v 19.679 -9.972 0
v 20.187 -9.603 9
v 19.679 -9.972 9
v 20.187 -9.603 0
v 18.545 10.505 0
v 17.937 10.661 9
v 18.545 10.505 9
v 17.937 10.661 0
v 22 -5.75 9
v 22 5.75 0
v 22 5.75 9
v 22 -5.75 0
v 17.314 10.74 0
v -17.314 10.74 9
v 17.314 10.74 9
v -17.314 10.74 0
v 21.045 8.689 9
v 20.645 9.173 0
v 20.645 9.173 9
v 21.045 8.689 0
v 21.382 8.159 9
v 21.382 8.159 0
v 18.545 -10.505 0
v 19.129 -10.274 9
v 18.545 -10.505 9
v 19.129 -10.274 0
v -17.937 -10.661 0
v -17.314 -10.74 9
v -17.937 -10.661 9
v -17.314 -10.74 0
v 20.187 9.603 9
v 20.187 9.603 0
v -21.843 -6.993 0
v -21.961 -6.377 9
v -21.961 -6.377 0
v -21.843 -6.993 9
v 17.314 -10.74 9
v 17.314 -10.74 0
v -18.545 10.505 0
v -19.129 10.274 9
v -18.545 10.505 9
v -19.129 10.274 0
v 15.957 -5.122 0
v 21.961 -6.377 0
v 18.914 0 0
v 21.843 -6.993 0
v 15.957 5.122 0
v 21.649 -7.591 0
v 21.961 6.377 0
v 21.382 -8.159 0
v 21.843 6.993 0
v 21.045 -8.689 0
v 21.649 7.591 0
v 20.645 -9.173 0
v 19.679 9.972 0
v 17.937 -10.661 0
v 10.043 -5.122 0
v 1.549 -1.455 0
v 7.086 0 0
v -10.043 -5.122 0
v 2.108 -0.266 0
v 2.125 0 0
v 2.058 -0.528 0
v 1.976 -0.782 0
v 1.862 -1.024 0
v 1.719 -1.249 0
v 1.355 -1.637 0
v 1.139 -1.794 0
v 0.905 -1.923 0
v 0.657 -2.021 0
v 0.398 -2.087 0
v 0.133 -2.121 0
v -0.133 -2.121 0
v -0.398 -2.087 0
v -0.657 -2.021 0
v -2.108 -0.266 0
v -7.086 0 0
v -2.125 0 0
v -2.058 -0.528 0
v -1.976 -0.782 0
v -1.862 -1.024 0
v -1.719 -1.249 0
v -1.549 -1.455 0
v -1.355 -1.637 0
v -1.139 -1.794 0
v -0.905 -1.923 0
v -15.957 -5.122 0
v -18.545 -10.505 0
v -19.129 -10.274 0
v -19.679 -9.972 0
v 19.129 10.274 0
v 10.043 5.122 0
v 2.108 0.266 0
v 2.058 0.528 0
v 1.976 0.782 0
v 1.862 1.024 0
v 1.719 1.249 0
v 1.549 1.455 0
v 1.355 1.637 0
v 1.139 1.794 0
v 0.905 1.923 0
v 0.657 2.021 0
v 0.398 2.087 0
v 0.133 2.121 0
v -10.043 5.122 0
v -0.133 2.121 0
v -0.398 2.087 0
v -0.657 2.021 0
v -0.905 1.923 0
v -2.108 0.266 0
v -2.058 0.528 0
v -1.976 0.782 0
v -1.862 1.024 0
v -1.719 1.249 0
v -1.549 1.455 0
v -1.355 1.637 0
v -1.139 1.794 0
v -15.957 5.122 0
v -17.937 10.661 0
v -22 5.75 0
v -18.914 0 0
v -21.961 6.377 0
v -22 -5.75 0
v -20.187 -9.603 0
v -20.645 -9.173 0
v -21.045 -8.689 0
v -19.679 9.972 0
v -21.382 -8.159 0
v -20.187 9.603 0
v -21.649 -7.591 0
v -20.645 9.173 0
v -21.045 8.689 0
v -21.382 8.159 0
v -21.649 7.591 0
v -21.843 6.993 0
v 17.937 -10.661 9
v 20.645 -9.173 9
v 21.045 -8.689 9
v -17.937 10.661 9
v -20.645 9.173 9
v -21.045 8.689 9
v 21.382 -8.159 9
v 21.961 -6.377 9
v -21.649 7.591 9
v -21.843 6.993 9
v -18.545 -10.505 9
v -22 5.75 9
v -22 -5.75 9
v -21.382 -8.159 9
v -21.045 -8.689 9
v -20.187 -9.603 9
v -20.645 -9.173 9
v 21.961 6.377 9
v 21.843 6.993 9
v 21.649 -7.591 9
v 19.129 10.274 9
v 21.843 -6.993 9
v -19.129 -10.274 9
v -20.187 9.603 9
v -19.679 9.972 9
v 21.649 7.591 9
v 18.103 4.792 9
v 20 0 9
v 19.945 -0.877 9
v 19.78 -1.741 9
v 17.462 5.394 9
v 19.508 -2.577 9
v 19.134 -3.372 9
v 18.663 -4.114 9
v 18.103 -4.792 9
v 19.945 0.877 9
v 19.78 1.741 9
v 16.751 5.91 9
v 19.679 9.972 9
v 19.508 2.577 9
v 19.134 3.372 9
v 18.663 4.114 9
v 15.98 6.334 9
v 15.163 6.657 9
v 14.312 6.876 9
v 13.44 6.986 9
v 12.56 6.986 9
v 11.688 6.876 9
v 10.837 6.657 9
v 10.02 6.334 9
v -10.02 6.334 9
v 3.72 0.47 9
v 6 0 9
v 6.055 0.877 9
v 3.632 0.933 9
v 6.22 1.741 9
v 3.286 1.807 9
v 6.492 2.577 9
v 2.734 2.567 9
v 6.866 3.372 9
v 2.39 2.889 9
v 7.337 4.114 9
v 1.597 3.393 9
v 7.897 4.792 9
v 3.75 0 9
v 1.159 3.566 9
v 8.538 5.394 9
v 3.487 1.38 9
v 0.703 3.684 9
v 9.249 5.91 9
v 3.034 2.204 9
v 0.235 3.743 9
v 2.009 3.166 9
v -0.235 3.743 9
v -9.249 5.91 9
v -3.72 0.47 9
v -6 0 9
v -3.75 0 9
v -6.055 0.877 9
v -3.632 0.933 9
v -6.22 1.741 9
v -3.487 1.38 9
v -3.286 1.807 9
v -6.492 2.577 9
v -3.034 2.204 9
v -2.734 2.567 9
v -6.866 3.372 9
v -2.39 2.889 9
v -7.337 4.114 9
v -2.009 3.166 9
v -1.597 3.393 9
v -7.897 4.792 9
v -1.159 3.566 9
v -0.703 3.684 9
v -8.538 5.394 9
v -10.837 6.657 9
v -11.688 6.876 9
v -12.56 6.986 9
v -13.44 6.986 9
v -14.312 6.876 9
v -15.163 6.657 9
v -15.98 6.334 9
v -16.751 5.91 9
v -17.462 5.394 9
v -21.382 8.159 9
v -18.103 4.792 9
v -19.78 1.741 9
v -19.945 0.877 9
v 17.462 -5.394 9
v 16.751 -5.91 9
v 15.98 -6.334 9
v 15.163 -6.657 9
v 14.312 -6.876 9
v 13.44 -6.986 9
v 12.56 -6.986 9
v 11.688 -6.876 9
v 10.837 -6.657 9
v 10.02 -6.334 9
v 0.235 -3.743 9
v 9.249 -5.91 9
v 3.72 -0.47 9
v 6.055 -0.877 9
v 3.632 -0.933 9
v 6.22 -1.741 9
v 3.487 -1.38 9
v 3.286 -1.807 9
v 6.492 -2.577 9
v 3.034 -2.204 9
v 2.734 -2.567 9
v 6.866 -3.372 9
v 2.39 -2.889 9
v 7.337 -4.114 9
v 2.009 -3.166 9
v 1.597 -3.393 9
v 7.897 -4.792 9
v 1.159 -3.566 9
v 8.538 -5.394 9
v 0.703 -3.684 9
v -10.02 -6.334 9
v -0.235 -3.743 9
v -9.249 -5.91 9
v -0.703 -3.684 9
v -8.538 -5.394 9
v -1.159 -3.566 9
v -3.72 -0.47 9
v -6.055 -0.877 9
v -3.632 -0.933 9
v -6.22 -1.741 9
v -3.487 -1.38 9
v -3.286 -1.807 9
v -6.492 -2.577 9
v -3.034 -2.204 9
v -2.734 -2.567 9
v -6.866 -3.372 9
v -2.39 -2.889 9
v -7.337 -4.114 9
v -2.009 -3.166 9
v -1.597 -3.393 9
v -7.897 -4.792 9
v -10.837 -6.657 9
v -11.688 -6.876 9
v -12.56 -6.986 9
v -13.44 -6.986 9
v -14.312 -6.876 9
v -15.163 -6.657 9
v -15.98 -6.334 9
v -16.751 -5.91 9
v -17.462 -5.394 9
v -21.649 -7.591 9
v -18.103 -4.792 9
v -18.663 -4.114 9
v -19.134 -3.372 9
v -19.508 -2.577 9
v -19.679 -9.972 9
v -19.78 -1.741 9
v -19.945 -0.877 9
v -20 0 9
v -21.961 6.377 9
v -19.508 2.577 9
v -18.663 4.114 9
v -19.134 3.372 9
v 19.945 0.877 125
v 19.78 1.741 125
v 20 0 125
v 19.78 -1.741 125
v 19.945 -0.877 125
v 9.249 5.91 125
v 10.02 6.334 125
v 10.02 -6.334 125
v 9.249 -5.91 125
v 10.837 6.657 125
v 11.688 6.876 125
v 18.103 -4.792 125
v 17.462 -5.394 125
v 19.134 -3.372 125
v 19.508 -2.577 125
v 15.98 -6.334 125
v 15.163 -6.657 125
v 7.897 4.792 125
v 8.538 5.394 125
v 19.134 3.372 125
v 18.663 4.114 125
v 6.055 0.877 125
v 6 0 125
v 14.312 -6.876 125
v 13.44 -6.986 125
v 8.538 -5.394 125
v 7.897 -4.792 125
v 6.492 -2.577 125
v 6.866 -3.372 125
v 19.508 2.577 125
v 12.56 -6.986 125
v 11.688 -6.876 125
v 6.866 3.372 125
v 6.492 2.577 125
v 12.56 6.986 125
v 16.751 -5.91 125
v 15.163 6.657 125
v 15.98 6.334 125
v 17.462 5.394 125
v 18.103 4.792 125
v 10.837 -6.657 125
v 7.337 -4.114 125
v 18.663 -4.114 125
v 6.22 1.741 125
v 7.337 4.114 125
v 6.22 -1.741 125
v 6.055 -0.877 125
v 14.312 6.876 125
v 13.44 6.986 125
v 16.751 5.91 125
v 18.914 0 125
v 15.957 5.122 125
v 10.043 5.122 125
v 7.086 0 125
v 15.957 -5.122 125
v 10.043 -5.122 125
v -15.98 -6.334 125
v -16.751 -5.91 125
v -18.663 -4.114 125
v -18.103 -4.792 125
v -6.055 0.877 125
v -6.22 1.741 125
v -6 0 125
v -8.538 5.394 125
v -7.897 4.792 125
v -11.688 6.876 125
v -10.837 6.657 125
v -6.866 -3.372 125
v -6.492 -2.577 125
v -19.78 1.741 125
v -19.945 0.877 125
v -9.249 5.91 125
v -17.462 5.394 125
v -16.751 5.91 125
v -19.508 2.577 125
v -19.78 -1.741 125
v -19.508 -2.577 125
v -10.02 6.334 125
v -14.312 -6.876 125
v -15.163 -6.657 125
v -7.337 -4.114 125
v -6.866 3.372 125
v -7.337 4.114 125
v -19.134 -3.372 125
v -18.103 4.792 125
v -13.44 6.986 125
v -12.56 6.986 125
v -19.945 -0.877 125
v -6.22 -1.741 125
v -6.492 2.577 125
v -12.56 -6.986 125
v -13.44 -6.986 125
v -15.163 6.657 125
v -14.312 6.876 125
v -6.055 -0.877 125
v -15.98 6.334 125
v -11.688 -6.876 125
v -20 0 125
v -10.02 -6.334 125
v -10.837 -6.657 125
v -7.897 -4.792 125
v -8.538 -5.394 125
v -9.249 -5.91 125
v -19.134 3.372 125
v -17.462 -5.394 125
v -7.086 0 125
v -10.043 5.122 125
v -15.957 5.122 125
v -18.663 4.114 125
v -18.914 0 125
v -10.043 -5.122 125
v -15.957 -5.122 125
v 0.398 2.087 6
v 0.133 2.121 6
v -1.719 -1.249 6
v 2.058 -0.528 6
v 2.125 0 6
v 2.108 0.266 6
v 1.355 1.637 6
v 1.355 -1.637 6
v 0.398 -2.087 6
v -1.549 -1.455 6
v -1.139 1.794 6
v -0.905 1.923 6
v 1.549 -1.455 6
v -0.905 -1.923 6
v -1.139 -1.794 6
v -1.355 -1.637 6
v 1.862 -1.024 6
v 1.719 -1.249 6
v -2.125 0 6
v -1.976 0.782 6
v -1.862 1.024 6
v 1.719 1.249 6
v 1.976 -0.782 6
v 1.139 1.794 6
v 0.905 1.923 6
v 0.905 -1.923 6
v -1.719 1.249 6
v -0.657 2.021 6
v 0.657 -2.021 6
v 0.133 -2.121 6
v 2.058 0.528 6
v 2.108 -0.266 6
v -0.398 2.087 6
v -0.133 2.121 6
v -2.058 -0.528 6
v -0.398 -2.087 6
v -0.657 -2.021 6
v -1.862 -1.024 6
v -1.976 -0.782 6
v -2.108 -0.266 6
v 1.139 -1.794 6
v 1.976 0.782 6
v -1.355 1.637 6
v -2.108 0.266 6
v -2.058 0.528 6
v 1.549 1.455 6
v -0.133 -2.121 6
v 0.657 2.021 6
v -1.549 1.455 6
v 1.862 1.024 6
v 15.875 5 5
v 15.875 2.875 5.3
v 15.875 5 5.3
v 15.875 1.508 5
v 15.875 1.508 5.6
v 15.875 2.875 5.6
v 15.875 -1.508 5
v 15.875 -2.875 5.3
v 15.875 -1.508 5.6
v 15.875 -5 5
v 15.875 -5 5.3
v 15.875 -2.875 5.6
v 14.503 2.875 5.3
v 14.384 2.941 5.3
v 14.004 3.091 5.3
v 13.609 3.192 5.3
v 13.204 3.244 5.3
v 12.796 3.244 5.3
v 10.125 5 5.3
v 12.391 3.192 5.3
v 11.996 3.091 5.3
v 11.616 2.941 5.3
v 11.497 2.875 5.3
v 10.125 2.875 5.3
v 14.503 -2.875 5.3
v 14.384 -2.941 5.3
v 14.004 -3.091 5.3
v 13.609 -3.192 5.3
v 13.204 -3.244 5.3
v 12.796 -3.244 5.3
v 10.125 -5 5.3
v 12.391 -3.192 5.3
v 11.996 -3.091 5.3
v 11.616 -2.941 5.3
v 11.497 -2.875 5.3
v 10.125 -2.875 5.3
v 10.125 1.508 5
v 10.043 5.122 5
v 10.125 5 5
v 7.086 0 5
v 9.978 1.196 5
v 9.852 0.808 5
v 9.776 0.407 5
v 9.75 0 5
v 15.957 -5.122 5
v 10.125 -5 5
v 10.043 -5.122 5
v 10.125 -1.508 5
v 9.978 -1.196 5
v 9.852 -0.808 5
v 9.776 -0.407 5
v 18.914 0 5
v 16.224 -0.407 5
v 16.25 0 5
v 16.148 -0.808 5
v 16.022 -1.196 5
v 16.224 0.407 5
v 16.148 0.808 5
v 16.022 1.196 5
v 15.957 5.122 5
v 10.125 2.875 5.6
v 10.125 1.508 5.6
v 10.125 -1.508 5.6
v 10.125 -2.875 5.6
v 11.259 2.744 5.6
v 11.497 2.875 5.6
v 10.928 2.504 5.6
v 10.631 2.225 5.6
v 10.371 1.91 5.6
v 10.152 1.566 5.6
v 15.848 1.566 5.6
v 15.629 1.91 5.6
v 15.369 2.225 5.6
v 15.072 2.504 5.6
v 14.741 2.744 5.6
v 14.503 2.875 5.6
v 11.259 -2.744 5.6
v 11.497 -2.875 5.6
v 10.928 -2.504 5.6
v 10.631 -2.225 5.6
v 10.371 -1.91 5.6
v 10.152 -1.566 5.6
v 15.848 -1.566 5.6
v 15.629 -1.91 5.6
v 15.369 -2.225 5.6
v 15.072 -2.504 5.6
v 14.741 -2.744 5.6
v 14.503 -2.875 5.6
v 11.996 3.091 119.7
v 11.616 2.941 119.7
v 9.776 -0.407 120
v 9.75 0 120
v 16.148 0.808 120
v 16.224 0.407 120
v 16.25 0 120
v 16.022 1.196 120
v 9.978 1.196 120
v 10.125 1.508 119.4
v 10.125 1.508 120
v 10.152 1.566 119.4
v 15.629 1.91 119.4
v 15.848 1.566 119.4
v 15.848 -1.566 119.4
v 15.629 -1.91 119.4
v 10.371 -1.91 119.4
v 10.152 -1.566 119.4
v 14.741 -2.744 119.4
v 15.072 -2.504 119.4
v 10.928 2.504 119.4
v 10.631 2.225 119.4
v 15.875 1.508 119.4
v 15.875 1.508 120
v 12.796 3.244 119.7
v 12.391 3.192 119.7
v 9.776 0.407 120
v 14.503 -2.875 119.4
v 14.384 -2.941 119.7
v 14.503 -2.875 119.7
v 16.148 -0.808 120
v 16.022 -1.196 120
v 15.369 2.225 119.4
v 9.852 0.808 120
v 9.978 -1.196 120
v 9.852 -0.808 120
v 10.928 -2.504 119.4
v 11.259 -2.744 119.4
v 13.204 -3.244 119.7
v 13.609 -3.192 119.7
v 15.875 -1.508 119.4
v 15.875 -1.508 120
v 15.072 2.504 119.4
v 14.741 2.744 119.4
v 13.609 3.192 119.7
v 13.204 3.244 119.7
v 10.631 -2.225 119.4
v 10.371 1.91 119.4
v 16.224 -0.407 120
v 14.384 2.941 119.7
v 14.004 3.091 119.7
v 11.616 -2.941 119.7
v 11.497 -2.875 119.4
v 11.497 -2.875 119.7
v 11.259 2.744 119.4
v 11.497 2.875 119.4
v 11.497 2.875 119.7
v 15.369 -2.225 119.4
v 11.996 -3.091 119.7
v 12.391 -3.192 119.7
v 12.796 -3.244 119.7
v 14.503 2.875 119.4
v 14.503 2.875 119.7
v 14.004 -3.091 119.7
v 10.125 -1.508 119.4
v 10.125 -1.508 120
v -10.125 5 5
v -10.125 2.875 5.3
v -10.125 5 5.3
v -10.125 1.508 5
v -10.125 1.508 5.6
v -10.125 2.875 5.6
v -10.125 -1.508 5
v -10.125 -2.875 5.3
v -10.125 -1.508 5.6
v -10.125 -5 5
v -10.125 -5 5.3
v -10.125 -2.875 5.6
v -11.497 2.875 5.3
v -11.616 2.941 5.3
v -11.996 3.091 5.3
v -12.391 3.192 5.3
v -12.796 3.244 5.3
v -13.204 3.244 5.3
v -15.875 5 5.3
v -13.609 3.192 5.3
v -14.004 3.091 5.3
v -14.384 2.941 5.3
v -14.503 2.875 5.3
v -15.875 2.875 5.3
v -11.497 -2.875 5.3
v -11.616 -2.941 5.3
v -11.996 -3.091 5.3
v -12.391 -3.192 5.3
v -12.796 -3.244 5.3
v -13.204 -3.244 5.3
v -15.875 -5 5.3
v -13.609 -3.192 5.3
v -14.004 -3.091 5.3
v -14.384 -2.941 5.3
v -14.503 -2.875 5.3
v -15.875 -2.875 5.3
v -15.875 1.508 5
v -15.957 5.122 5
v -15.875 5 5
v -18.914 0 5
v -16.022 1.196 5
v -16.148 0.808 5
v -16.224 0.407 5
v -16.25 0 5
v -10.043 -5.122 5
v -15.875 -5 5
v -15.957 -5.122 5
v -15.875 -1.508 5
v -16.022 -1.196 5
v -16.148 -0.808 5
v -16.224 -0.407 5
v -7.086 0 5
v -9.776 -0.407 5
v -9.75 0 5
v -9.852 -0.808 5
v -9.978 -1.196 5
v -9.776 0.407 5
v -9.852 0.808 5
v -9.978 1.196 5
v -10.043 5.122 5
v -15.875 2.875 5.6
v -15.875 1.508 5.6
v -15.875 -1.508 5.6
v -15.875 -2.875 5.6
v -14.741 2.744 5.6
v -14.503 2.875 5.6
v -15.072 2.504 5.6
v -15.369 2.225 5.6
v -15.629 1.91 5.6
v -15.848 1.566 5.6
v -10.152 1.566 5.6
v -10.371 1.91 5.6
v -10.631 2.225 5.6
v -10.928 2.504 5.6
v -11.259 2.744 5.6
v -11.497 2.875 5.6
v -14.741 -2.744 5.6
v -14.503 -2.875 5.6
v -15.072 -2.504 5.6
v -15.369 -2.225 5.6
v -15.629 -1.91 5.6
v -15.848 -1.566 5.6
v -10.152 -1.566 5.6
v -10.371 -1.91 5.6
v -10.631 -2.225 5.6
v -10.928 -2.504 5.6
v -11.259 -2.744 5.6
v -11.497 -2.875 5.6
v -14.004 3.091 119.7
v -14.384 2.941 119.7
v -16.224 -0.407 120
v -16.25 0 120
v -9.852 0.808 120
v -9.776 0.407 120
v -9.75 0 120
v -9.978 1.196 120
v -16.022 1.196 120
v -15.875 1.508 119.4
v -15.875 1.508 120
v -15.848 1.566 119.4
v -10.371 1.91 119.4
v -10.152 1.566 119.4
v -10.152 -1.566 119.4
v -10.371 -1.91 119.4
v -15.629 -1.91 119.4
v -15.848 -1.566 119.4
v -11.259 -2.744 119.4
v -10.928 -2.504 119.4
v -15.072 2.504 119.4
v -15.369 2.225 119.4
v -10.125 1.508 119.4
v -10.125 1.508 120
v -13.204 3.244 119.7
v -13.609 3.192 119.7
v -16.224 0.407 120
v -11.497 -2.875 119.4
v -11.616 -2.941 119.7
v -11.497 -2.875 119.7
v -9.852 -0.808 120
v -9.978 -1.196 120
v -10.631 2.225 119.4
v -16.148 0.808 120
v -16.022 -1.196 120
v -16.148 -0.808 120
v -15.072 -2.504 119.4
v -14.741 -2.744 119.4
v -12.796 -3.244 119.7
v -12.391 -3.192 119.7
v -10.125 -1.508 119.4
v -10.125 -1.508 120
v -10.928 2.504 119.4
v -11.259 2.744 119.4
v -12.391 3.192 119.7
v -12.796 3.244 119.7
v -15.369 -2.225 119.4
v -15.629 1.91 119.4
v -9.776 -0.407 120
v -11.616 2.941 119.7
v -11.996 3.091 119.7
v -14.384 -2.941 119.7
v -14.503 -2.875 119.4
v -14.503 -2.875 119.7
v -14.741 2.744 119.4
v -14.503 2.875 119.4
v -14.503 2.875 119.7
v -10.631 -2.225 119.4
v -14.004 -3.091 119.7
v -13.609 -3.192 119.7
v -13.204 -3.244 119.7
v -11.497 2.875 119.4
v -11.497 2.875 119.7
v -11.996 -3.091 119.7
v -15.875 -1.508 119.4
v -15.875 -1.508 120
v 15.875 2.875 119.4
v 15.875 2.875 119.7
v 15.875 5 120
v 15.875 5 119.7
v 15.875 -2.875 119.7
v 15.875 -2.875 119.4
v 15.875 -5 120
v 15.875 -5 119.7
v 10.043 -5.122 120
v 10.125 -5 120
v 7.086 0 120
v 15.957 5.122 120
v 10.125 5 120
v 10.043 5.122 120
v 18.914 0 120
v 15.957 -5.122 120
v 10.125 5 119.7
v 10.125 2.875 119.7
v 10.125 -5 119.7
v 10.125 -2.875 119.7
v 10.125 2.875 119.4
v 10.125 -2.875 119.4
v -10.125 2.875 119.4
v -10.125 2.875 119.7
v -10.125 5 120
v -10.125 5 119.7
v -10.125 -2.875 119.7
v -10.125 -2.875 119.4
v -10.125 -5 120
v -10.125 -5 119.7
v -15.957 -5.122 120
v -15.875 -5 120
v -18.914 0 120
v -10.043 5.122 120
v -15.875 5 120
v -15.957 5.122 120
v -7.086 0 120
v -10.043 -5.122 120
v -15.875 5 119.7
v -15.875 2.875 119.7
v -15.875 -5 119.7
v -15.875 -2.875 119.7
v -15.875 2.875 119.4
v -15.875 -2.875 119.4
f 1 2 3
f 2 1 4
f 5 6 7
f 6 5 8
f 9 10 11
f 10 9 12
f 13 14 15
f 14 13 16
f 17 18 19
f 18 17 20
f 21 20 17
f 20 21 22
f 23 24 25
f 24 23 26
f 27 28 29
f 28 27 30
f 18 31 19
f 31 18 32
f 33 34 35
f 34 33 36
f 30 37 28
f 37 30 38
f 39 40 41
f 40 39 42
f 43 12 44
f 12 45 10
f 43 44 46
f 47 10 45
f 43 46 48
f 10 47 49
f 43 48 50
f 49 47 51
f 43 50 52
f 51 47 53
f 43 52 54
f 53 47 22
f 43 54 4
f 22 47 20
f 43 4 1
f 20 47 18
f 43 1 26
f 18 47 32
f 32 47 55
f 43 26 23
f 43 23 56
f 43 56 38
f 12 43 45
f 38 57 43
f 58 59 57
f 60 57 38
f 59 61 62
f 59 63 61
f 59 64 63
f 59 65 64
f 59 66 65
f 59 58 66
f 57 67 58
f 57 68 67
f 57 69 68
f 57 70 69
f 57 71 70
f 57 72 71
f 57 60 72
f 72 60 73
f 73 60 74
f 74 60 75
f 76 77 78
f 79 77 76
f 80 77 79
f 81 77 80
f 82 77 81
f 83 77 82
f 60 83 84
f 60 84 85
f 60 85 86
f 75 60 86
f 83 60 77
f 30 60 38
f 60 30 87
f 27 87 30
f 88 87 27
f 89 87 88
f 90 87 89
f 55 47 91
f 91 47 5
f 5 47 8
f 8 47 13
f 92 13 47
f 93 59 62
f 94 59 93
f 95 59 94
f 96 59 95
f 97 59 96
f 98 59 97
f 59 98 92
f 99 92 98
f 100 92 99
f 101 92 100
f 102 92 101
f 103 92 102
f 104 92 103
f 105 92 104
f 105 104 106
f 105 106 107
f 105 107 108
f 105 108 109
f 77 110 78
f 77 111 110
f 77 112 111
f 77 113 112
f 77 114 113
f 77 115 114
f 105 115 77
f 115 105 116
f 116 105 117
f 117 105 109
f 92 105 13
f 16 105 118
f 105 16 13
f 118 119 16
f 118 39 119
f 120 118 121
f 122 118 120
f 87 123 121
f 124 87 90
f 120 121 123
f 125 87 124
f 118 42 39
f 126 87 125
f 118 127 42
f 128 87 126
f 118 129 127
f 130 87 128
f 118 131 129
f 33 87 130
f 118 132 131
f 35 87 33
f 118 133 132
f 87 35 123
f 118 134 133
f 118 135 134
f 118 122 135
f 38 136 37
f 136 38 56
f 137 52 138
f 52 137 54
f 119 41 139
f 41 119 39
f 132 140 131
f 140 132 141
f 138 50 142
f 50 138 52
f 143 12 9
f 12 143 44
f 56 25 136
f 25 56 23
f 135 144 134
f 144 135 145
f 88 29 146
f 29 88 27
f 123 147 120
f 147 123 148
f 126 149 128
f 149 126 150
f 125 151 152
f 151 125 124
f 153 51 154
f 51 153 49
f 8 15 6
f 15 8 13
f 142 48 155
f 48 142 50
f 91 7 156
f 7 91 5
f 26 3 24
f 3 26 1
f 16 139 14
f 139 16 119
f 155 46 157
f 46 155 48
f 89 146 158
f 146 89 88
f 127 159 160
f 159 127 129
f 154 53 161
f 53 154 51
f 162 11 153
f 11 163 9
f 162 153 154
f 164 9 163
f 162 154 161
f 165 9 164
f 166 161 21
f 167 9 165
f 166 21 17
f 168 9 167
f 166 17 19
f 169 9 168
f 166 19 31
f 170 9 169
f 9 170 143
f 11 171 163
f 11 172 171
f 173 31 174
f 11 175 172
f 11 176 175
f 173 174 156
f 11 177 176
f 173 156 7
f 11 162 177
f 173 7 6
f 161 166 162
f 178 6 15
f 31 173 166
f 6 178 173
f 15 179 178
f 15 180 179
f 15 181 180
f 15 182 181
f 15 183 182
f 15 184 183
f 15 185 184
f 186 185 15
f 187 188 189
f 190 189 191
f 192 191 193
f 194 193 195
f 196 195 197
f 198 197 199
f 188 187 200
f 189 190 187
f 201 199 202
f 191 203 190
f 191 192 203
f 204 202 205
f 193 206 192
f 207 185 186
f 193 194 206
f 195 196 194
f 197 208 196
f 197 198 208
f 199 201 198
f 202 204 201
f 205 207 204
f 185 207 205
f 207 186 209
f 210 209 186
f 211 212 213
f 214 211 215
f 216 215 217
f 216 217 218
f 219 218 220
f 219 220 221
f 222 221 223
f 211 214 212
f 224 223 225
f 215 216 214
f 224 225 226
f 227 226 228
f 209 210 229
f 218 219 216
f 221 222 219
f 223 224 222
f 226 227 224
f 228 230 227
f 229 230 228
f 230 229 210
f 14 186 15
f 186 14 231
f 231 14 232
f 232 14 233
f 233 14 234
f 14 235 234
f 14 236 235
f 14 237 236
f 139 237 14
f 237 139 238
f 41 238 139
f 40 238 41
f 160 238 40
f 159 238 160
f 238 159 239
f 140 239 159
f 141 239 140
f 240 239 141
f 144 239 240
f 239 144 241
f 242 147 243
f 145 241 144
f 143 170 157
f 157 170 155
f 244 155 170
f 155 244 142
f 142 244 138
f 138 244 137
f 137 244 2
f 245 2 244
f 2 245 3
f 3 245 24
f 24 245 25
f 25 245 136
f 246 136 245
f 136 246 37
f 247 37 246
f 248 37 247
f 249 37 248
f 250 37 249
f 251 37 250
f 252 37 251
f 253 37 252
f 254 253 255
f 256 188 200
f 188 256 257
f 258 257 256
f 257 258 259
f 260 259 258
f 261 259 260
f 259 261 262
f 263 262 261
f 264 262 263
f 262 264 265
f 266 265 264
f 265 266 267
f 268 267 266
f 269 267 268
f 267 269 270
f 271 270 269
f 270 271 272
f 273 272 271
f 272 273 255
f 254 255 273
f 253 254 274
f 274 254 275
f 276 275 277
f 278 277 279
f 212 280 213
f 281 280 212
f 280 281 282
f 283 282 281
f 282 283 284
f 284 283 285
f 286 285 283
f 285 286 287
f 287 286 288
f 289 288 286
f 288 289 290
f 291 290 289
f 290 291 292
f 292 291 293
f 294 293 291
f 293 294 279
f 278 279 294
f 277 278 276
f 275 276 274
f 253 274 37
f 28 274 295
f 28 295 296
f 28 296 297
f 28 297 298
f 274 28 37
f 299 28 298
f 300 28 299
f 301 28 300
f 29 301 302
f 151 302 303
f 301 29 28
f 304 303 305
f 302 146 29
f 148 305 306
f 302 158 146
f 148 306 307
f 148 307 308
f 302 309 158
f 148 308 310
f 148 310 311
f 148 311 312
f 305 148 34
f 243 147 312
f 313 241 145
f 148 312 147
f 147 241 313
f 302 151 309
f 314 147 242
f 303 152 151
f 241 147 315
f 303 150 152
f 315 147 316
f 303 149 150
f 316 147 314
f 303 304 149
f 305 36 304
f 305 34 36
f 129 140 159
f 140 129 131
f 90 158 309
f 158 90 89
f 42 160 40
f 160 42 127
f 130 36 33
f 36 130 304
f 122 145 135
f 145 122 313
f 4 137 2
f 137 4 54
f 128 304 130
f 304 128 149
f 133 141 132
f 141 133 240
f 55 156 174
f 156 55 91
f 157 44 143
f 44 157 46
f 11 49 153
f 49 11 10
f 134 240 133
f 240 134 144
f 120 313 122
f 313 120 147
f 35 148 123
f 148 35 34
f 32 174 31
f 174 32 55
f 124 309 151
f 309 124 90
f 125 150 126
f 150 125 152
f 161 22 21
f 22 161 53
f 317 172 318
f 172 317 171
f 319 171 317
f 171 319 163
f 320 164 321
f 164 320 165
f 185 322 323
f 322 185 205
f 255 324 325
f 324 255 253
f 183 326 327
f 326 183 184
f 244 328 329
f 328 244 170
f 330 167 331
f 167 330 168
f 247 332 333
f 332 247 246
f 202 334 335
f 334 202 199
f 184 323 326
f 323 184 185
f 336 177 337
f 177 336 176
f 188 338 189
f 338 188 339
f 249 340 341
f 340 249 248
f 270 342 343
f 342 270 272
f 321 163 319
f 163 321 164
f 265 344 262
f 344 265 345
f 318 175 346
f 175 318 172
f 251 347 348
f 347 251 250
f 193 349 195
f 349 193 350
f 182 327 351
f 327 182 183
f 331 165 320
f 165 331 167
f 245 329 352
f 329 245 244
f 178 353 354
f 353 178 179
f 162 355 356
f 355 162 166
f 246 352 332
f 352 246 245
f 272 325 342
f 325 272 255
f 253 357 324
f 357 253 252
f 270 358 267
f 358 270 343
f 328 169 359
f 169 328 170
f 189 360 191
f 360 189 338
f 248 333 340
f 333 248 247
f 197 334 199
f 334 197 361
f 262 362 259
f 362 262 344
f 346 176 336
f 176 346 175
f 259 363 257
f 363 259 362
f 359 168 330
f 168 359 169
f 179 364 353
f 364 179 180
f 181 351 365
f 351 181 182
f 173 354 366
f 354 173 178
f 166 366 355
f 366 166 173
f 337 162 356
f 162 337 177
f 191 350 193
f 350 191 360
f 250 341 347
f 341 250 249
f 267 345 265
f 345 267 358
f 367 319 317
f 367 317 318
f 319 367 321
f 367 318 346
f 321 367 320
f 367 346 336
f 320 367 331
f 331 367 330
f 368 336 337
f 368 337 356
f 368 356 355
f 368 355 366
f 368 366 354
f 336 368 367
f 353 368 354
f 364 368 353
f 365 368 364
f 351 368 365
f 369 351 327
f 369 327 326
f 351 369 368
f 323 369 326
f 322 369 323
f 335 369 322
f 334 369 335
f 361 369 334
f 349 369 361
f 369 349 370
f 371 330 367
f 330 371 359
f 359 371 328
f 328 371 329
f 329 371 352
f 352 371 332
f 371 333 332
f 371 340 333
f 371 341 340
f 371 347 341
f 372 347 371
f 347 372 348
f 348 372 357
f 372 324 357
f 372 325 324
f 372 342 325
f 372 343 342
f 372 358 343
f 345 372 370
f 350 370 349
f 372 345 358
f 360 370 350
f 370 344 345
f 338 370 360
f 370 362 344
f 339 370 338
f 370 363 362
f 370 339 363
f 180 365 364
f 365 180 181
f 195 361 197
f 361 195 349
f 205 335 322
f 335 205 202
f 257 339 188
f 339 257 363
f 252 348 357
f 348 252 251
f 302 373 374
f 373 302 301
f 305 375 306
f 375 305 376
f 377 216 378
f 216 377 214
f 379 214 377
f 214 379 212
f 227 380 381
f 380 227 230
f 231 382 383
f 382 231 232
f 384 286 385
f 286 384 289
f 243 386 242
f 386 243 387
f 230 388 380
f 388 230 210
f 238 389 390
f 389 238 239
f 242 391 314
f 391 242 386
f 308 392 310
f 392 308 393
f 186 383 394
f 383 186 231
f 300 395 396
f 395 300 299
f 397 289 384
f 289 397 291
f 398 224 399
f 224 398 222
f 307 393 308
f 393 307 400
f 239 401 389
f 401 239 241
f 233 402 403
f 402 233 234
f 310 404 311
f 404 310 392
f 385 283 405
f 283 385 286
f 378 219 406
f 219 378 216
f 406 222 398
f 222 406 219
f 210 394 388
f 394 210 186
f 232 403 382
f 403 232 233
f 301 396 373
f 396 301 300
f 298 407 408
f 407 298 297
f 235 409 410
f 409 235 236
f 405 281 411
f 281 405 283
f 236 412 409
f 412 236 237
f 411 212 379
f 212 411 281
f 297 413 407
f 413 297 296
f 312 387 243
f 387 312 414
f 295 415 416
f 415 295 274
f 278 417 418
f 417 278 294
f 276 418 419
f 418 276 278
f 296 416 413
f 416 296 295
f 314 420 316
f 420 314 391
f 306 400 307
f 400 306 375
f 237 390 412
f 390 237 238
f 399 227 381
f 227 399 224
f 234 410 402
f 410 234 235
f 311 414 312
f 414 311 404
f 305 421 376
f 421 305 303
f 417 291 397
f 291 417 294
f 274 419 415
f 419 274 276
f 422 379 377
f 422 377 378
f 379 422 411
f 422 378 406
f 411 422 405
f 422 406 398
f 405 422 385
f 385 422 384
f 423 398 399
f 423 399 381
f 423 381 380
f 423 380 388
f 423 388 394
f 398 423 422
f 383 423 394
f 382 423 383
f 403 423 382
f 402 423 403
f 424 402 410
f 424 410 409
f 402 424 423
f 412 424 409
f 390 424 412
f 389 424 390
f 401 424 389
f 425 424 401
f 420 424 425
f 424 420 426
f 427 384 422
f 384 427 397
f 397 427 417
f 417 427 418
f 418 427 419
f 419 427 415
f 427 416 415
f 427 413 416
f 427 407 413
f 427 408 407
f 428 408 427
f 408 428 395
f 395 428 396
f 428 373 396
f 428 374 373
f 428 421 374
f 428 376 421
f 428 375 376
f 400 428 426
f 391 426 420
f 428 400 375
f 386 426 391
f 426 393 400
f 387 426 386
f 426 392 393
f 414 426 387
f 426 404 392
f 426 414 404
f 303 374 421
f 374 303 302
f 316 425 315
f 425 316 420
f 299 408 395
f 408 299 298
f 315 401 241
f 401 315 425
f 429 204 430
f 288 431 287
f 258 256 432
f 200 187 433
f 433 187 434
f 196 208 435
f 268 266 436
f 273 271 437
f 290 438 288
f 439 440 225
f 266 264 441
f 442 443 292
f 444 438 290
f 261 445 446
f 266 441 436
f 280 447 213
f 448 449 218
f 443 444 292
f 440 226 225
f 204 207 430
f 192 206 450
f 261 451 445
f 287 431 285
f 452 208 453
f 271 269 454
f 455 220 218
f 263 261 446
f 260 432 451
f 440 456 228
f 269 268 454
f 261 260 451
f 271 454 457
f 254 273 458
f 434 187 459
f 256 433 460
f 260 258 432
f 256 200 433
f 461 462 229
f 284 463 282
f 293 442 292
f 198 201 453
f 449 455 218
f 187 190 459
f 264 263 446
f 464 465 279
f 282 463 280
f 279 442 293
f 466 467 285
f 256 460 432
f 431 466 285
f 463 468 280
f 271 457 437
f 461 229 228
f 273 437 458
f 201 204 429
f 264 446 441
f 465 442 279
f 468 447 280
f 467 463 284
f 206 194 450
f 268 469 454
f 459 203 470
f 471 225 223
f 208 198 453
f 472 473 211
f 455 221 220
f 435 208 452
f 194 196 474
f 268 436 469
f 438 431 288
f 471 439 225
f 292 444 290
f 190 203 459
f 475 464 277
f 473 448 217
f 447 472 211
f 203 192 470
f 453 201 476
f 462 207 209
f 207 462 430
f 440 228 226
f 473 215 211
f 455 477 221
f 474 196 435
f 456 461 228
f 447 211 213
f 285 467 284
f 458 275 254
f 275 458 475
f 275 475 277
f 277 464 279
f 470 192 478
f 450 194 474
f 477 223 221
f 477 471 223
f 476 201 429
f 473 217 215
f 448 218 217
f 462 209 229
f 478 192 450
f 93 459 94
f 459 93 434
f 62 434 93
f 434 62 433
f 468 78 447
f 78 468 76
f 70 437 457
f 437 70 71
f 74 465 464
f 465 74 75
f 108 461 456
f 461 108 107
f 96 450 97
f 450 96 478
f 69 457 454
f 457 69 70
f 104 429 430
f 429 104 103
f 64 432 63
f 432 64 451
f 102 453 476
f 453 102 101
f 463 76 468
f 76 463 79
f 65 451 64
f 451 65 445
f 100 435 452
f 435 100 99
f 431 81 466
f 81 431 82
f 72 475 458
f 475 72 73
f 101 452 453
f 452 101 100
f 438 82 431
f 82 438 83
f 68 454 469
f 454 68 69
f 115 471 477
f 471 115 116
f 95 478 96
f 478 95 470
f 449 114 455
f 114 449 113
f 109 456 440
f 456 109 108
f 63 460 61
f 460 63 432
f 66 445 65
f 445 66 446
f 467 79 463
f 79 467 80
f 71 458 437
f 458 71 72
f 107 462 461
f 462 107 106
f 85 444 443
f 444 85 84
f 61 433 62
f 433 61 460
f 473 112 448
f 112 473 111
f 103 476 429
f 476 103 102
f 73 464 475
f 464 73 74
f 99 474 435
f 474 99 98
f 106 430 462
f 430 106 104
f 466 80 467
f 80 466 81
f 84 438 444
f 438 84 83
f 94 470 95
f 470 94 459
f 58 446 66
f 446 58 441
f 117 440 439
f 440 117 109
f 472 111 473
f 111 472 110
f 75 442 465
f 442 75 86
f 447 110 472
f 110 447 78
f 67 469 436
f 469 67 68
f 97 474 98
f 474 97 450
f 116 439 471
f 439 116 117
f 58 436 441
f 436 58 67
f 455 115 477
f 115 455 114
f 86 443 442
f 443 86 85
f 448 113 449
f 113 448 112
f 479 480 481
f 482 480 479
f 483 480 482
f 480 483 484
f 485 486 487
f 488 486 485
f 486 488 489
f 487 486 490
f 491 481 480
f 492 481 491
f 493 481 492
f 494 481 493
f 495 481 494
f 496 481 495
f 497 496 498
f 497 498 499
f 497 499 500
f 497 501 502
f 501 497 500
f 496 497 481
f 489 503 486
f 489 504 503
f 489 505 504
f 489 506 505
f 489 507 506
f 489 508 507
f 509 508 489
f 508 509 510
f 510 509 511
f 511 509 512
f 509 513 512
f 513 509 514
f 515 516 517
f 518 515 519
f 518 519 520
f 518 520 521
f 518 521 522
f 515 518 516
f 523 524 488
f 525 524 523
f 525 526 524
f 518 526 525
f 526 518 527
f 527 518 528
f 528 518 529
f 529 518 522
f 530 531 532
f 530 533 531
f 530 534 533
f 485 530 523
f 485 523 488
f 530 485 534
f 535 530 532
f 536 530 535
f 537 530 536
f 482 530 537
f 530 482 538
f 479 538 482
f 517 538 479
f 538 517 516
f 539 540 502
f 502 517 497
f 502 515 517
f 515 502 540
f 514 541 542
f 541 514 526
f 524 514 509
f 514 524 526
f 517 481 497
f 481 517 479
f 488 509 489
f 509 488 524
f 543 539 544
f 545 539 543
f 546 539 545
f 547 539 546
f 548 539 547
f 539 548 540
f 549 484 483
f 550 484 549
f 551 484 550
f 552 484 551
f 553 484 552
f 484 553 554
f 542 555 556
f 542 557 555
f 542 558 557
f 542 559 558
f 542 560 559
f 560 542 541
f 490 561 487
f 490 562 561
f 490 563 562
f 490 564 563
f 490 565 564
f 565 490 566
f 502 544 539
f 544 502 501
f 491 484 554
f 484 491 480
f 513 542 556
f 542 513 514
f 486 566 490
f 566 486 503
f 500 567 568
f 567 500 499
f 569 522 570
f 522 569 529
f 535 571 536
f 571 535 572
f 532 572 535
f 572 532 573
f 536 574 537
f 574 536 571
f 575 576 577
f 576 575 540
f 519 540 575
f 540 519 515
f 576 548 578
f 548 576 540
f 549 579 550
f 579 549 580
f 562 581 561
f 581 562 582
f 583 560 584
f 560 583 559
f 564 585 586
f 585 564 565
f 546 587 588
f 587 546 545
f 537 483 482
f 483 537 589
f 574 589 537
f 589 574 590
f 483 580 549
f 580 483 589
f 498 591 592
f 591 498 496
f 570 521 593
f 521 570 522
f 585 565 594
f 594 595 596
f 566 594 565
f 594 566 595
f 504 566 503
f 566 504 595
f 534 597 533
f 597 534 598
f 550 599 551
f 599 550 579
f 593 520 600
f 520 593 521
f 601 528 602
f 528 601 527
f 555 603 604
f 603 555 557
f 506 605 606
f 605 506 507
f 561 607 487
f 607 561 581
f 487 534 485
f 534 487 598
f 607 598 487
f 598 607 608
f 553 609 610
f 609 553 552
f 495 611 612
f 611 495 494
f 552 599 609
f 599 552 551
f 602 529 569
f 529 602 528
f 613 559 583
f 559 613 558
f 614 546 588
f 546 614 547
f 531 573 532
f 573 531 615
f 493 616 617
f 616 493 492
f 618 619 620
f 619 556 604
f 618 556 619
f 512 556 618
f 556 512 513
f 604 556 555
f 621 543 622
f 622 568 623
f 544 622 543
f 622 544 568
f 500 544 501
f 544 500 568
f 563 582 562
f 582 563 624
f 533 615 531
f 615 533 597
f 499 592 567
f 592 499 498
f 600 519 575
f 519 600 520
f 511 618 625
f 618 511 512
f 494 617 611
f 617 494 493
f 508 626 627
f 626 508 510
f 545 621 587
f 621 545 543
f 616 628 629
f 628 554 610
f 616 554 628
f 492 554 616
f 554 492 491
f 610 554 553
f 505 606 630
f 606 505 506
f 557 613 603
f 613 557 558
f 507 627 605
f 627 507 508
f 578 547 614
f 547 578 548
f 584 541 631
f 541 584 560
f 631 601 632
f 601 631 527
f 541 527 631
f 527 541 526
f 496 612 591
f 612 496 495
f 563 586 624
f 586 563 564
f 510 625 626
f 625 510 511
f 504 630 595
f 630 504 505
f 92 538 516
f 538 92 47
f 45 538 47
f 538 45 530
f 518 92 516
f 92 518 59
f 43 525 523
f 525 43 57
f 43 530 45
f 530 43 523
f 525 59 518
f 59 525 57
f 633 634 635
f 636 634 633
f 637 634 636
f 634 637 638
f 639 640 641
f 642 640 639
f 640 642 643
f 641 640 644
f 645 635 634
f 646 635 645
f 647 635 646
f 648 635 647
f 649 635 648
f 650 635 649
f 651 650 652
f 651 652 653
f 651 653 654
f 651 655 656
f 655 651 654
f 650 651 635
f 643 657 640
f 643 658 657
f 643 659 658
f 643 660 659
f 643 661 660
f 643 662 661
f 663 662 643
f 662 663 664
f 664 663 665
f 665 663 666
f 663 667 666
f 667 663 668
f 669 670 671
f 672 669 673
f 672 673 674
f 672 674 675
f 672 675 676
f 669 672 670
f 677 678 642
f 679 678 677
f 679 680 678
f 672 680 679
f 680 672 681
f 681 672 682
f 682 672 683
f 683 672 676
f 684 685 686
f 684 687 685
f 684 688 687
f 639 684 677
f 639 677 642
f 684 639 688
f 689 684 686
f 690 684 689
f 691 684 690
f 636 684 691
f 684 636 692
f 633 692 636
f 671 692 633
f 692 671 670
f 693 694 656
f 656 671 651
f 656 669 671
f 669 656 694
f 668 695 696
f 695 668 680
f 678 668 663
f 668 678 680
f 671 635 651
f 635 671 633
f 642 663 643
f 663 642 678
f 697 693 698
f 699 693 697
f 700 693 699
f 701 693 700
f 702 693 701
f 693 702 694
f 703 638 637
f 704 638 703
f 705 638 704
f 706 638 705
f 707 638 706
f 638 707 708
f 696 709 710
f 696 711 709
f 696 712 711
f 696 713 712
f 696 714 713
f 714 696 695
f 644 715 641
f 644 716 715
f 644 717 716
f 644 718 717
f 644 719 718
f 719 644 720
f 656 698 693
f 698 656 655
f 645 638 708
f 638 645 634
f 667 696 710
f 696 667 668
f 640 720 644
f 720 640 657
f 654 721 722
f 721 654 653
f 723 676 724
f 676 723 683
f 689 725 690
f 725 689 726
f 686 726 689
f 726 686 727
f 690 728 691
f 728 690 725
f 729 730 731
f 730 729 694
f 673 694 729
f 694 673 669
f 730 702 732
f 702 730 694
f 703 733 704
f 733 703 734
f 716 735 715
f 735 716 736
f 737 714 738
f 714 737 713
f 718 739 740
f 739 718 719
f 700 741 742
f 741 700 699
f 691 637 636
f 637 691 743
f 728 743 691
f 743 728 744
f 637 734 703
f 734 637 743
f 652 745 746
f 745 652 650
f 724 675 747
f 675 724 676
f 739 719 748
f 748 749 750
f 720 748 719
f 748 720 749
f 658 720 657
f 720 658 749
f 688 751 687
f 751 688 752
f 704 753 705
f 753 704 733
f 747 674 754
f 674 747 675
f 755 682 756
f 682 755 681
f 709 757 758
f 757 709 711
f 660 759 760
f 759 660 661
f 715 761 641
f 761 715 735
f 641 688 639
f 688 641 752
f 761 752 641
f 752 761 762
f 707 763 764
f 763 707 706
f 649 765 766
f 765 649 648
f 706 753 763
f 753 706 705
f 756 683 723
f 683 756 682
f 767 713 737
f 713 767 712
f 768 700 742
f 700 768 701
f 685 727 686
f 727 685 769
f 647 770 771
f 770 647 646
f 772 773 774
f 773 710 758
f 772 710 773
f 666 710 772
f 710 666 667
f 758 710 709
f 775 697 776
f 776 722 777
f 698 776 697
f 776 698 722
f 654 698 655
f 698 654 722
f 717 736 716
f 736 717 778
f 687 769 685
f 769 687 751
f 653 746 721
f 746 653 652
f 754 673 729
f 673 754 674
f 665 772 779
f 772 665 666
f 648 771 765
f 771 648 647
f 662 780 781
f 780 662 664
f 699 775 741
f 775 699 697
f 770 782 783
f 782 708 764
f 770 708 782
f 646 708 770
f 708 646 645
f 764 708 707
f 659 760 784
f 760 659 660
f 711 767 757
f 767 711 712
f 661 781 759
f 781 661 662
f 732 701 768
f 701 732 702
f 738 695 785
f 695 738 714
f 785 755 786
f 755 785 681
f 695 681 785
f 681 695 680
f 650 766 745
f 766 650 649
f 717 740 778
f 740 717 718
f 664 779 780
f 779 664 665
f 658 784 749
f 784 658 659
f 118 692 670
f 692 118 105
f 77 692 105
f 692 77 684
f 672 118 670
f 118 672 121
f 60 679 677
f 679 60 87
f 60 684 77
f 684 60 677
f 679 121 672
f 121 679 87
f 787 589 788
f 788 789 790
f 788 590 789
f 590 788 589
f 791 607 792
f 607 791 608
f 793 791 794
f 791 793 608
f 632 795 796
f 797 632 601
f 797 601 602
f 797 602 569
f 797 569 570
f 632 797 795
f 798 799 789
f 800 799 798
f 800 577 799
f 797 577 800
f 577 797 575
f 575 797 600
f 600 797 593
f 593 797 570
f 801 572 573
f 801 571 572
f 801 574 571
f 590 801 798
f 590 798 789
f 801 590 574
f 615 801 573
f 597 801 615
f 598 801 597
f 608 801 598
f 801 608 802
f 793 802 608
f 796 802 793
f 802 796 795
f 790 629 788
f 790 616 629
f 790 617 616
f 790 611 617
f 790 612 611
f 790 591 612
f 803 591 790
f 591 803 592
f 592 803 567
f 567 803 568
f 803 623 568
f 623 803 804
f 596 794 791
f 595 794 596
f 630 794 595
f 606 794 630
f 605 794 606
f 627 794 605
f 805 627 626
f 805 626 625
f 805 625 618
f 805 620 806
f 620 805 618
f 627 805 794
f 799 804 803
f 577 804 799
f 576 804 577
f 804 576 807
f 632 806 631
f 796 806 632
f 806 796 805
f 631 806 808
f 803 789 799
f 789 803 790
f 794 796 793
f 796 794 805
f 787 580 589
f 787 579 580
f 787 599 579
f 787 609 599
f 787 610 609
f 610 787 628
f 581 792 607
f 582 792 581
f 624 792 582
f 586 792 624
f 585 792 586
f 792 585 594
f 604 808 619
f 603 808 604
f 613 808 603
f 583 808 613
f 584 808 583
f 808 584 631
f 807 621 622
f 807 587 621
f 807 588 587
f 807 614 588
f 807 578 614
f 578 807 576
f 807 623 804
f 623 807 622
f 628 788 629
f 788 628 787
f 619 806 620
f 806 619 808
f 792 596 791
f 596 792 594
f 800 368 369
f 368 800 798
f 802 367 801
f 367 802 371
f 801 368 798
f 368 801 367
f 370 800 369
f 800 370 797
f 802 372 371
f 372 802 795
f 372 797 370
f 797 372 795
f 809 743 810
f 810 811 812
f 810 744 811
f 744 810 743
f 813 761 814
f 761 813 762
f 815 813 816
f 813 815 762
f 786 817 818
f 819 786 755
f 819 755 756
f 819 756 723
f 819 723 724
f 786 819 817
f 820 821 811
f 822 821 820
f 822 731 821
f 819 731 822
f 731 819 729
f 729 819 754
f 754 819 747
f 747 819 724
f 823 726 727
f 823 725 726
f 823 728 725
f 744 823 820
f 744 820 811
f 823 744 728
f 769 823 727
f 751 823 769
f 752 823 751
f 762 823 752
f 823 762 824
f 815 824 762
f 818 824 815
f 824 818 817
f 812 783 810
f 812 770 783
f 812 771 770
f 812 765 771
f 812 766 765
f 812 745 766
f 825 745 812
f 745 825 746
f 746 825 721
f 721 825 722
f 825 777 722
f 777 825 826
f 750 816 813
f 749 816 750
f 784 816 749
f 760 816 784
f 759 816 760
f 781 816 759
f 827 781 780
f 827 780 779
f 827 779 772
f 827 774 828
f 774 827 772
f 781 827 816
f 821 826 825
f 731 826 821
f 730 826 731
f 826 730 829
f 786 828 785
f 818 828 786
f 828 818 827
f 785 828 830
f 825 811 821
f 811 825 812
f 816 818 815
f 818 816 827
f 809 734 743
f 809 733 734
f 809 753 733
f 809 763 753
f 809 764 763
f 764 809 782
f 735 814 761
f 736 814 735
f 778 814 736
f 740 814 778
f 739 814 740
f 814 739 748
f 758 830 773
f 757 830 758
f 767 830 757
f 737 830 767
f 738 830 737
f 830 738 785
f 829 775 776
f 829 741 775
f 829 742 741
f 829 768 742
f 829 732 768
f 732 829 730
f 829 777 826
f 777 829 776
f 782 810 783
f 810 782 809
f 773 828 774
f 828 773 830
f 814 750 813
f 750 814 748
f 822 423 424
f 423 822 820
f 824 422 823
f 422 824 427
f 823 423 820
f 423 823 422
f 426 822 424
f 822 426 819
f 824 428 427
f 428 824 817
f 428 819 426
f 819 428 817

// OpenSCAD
$fn = 50;


difference() {
	union() {
		hull() {
			translate(v = [-17.0000000000, 5.7500000000, 0]) {
				cylinder(h = 9, r = 5);
			}
			translate(v = [17.0000000000, 5.7500000000, 0]) {
				cylinder(h = 9, r = 5);
			}
			translate(v = [-17.0000000000, -5.7500000000, 0]) {
				cylinder(h = 9, r = 5);
			}
			translate(v = [17.0000000000, -5.7500000000, 0]) {
				cylinder(h = 9, r = 5);
			}
		}
		translate(v = [13.0000000000, 0, 0.0000000000]) {
			cylinder(h = 125, r = 7.0000000000);
		}
		translate(v = [-13.0000000000, 0, 0.0000000000]) {
			cylinder(h = 125, r = 7.0000000000);
		}
		translate(v = [13.0000000000, 0, 119.0000000000]) {
			cylinder(h = 6, r = 7.0000000000);
		}
		translate(v = [-13.0000000000, 0, 119.0000000000]) {
			cylinder(h = 6, r = 7.0000000000);
		}
	}
	union() {
		translate(v = [0, 0, 9]) {
			rotate(a = [0, 0, 0]) {
				difference() {
					union() {
						#translate(v = [0, 0, -120.0000000000]) {
							cylinder(h = 120, r = 2.0000000000);
						}
						#translate(v = [0, 0, -3]) {
							cylinder(h = 3, r1 = 2.1250000000, r2 = 3.7500000000);
						}
						#translate(v = [0, 0, -120.0000000000]) {
							cylinder(h = 120, r = 2.1250000000);
						}
						#translate(v = [0, 0, -120.0000000000]) {
							cylinder(h = 120, r = 2.0000000000);
						}
					}
					union();
				}
			}
		}
		translate(v = [13.0000000000, 0, 0]) {
			rotate(a = [0, 0, 0]) {
				difference() {
					union() {
						#translate(v = [-2.8750000000, -5.0000000000, -0.3000000000]) {
							cube(size = [5.7500000000, 10, 0.3000000000]);
						}
						#translate(v = [-2.8750000000, -2.8750000000, -0.6000000000]) {
							cube(size = [5.7500000000, 5.7500000000, 0.3000000000]);
						}
						#translate(v = [-2.8750000000, -5.0000000000, 5]) {
							cube(size = [5.7500000000, 10, 0.3000000000]);
						}
						#translate(v = [-2.8750000000, -2.8750000000, 5.3000000000]) {
							cube(size = [5.7500000000, 5.7500000000, 0.3000000000]);
						}
						#translate(v = [0, 0, -100.0000000000]) {
							cylinder(h = 200, r = 3.2500000000);
						}
						#linear_extrude(height = 5) {
							polygon(points = [[5.9142500000, 0.0000000000], [2.9571250000, 5.1218907443], [-2.9571250000, 5.1218907443], [-5.9142500000, 0.0000000000], [-2.9571250000, -5.1218907443], [2.9571250000, -5.1218907443]]);
						}
						#translate(v = [-2.8750000000, -5.0000000000, -0.3000000000]) {
							cube(size = [5.7500000000, 10, 0.3000000000]);
						}
						#translate(v = [-2.8750000000, -2.8750000000, -0.6000000000]) {
							cube(size = [5.7500000000, 5.7500000000, 0.3000000000]);
						}
						#translate(v = [-2.8750000000, -5.0000000000, 5]) {
							cube(size = [5.7500000000, 10, 0.3000000000]);
						}
						#translate(v = [-2.8750000000, -2.8750000000, 5.3000000000]) {
							cube(size = [5.7500000000, 5.7500000000, 0.3000000000]);
						}
						#translate(v = [0, 0, -100.0000000000]) {
							cylinder(h = 200, r = 3.2500000000);
						}
						#translate(v = [-2.8750000000, -5.0000000000, -0.3000000000]) {
							cube(size = [5.7500000000, 10, 0.3000000000]);
						}
						#translate(v = [-2.8750000000, -2.8750000000, -0.6000000000]) {
							cube(size = [5.7500000000, 5.7500000000, 0.3000000000]);
						}
						#translate(v = [-2.8750000000, -5.0000000000, 5]) {
							cube(size = [5.7500000000, 10, 0.3000000000]);
						}
						#translate(v = [-2.8750000000, -2.8750000000, 5.3000000000]) {
							cube(size = [5.7500000000, 5.7500000000, 0.3000000000]);
						}
						#translate(v = [0, 0, -100.0000000000]) {
							cylinder(h = 200, r = 3.2500000000);
						}
					}
					union();
				}
			}
		}
		translate(v = [-13.0000000000, 0, 0]) {
			rotate(a = [0, 0, 0]) {
				difference() {
					union() {
						#translate(v = [-2.8750000000, -5.0000000000, -0.3000000000]) {
							cube(size = [5.7500000000, 10, 0.3000000000]);
						}
						#translate(v = [-2.8750000000, -2.8750000000, -0.6000000000]) {
							cube(size = [5.7500000000, 5.7500000000, 0.3000000000]);
						}
						#translate(v = [-2.8750000000, -5.0000000000, 5]) {
							cube(size = [5.7500000000, 10, 0.3000000000]);
						}
						#translate(v = [-2.8750000000, -2.8750000000, 5.3000000000]) {
							cube(size = [5.7500000000, 5.7500000000, 0.3000000000]);
						}
						#translate(v = [0, 0, -100.0000000000]) {
							cylinder(h = 200, r = 3.2500000000);
						}
						#linear_extrude(height = 5) {
							polygon(points = [[5.9142500000, 0.0000000000], [2.9571250000, 5.1218907443], [-2.9571250000, 5.1218907443], [-5.9142500000, 0.0000000000], [-2.9571250000, -5.1218907443], [2.9571250000, -5.1218907443]]);
						}
						#translate(v = [-2.8750000000, -5.0000000000, -0.3000000000]) {
							cube(size = [5.7500000000, 10, 0.3000000000]);
						}
						#translate(v = [-2.8750000000, -2.8750000000, -0.6000000000]) {
							cube(size = [5.7500000000, 5.7500000000, 0.3000000000]);
						}
						#translate(v = [-2.8750000000, -5.0000000000, 5]) {
							cube(size = [5.7500000000, 10, 0.3000000000]);
						}
						#translate(v = [-2.8750000000, -2.8750000000, 5.3000000000]) {
							cube(size = [5.7500000000, 5.7500000000, 0.3000000000]);
						}
						#translate(v = [0, 0, -100.0000000000]) {
							cylinder(h = 200, r = 3.2500000000);
						}
						#translate(v = [-2.8750000000, -5.0000000000, -0.3000000000]) {
							cube(size = [5.7500000000, 10, 0.3000000000]);
						}
						#translate(v = [-2.8750000000, -2.8750000000, -0.6000000000]) {
							cube(size = [5.7500000000, 5.7500000000, 0.3000000000]);
						}
						#translate(v = [-2.8750000000, -5.0000000000, 5]) {
							cube(size = [5.7500000000, 10, 0.3000000000]);
						}
						#translate(v = [-2.8750000000, -2.8750000000, 5.3000000000]) {
							cube(size = [5.7500000000, 5.7500000000, 0.3000000000]);
						}
						#translate(v = [0, 0, -100.0000000000]) {
							cylinder(h = 200, r = 3.2500000000);
						}
					}
					union();
				}
			}
		}
		translate(v = [13.0000000000, 0, 125]) {
			rotate(a = [0, 0, 0]) {
				difference() {
					union() {
						#translate(v = [-2.8750000000, -5.0000000000, -5.3000000000]) {
							cube(size = [5.7500000000, 10, 0.3000000000]);
						}
						#translate(v = [-2.8750000000, -2.8750000000, -5.6000000000]) {
							cube(size = [5.7500000000, 5.7500000000, 0.3000000000]);
						}
						#translate(v = [-2.8750000000, -5.0000000000, 0]) {
							cube(size = [5.7500000000, 10, 0.3000000000]);
						}
						#translate(v = [-2.8750000000, -2.8750000000, 0.3000000000]) {
							cube(size = [5.7500000000, 5.7500000000, 0.3000000000]);
						}
						#translate(v = [0, 0, -100.0000000000]) {
							cylinder(h = 200, r = 3.2500000000);
						}
						translate(v = [0, 0, -5]) {
							#linear_extrude(height = 5) {
								polygon(points = [[5.9142500000, 0.0000000000], [2.9571250000, 5.1218907443], [-2.9571250000, 5.1218907443], [-5.9142500000, 0.0000000000], [-2.9571250000, -5.1218907443], [2.9571250000, -5.1218907443]]);
							}
						}
						#translate(v = [-2.8750000000, -5.0000000000, -5.3000000000]) {
							cube(size = [5.7500000000, 10, 0.3000000000]);
						}
						#translate(v = [-2.8750000000, -2.8750000000, -5.6000000000]) {
							cube(size = [5.7500000000, 5.7500000000, 0.3000000000]);
						}
						#translate(v = [-2.8750000000, -5.0000000000, 0]) {
							cube(size = [5.7500000000, 10, 0.3000000000]);
						}
						#translate(v = [-2.8750000000, -2.8750000000, 0.3000000000]) {
							cube(size = [5.7500000000, 5.7500000000, 0.3000000000]);
						}
						#translate(v = [0, 0, -100.0000000000]) {
							cylinder(h = 200, r = 3.2500000000);
						}
						#translate(v = [-2.8750000000, -5.0000000000, -5.3000000000]) {
							cube(size = [5.7500000000, 10, 0.3000000000]);
						}
						#translate(v = [-2.8750000000, -2.8750000000, -5.6000000000]) {
							cube(size = [5.7500000000, 5.7500000000, 0.3000000000]);
						}
						#translate(v = [-2.8750000000, -5.0000000000, 0]) {
							cube(size = [5.7500000000, 10, 0.3000000000]);
						}
						#translate(v = [-2.8750000000, -2.8750000000, 0.3000000000]) {
							cube(size = [5.7500000000, 5.7500000000, 0.3000000000]);
						}
						#translate(v = [0, 0, -100.0000000000]) {
							cylinder(h = 200, r = 3.2500000000);
						}
					}
					union();
				}
			}
		}
		translate(v = [-13.0000000000, 0, 125]) {
			rotate(a = [0, 0, 0]) {
				difference() {
					union() {
						#translate(v = [-2.8750000000, -5.0000000000, -5.3000000000]) {
							cube(size = [5.7500000000, 10, 0.3000000000]);
						}
						#translate(v = [-2.8750000000, -2.8750000000, -5.6000000000]) {
							cube(size = [5.7500000000, 5.7500000000, 0.3000000000]);
						}
						#translate(v = [-2.8750000000, -5.0000000000, 0]) {
							cube(size = [5.7500000000, 10, 0.3000000000]);
						}
						#translate(v = [-2.8750000000, -2.8750000000, 0.3000000000]) {
							cube(size = [5.7500000000, 5.7500000000, 0.3000000000]);
						}
						#translate(v = [0, 0, -100.0000000000]) {
							cylinder(h = 200, r = 3.2500000000);
						}
						translate(v = [0, 0, -5]) {
							#linear_extrude(height = 5) {
								polygon(points = [[5.9142500000, 0.0000000000], [2.9571250000, 5.1218907443], [-2.9571250000, 5.1218907443], [-5.9142500000, 0.0000000000], [-2.9571250000, -5.1218907443], [2.9571250000, -5.1218907443]]);
							}
						}
						#translate(v = [-2.8750000000, -5.0000000000, -5.3000000000]) {
							cube(size = [5.7500000000, 10, 0.3000000000]);
						}
						#translate(v = [-2.8750000000, -2.8750000000, -5.6000000000]) {
							cube(size = [5.7500000000, 5.7500000000, 0.3000000000]);
						}
						#translate(v = [-2.8750000000, -5.0000000000, 0]) {
							cube(size = [5.7500000000, 10, 0.3000000000]);
						}
						#translate(v = [-2.8750000000, -2.8750000000, 0.3000000000]) {
							cube(size = [5.7500000000, 5.7500000000, 0.3000000000]);
						}
						#translate(v = [0, 0, -100.0000000000]) {
							cylinder(h = 200, r = 3.2500000000);
						}
						#translate(v = [-2.8750000000, -5.0000000000, -5.3000000000]) {
							cube(size = [5.7500000000, 10, 0.3000000000]);
						}
						#translate(v = [-2.8750000000, -2.8750000000, -5.6000000000]) {
							cube(size = [5.7500000000, 5.7500000000, 0.3000000000]);
						}
						#translate(v = [-2.8750000000, -5.0000000000, 0]) {
							cube(size = [5.7500000000, 10, 0.3000000000]);
						}
						#translate(v = [-2.8750000000, -2.8750000000, 0.3000000000]) {
							cube(size = [5.7500000000, 5.7500000000, 0.3000000000]);
						}
						#translate(v = [0, 0, -100.0000000000]) {
							cylinder(h = 200, r = 3.2500000000);
						}
					}
					union();
				}
			}
		}
	}
}
